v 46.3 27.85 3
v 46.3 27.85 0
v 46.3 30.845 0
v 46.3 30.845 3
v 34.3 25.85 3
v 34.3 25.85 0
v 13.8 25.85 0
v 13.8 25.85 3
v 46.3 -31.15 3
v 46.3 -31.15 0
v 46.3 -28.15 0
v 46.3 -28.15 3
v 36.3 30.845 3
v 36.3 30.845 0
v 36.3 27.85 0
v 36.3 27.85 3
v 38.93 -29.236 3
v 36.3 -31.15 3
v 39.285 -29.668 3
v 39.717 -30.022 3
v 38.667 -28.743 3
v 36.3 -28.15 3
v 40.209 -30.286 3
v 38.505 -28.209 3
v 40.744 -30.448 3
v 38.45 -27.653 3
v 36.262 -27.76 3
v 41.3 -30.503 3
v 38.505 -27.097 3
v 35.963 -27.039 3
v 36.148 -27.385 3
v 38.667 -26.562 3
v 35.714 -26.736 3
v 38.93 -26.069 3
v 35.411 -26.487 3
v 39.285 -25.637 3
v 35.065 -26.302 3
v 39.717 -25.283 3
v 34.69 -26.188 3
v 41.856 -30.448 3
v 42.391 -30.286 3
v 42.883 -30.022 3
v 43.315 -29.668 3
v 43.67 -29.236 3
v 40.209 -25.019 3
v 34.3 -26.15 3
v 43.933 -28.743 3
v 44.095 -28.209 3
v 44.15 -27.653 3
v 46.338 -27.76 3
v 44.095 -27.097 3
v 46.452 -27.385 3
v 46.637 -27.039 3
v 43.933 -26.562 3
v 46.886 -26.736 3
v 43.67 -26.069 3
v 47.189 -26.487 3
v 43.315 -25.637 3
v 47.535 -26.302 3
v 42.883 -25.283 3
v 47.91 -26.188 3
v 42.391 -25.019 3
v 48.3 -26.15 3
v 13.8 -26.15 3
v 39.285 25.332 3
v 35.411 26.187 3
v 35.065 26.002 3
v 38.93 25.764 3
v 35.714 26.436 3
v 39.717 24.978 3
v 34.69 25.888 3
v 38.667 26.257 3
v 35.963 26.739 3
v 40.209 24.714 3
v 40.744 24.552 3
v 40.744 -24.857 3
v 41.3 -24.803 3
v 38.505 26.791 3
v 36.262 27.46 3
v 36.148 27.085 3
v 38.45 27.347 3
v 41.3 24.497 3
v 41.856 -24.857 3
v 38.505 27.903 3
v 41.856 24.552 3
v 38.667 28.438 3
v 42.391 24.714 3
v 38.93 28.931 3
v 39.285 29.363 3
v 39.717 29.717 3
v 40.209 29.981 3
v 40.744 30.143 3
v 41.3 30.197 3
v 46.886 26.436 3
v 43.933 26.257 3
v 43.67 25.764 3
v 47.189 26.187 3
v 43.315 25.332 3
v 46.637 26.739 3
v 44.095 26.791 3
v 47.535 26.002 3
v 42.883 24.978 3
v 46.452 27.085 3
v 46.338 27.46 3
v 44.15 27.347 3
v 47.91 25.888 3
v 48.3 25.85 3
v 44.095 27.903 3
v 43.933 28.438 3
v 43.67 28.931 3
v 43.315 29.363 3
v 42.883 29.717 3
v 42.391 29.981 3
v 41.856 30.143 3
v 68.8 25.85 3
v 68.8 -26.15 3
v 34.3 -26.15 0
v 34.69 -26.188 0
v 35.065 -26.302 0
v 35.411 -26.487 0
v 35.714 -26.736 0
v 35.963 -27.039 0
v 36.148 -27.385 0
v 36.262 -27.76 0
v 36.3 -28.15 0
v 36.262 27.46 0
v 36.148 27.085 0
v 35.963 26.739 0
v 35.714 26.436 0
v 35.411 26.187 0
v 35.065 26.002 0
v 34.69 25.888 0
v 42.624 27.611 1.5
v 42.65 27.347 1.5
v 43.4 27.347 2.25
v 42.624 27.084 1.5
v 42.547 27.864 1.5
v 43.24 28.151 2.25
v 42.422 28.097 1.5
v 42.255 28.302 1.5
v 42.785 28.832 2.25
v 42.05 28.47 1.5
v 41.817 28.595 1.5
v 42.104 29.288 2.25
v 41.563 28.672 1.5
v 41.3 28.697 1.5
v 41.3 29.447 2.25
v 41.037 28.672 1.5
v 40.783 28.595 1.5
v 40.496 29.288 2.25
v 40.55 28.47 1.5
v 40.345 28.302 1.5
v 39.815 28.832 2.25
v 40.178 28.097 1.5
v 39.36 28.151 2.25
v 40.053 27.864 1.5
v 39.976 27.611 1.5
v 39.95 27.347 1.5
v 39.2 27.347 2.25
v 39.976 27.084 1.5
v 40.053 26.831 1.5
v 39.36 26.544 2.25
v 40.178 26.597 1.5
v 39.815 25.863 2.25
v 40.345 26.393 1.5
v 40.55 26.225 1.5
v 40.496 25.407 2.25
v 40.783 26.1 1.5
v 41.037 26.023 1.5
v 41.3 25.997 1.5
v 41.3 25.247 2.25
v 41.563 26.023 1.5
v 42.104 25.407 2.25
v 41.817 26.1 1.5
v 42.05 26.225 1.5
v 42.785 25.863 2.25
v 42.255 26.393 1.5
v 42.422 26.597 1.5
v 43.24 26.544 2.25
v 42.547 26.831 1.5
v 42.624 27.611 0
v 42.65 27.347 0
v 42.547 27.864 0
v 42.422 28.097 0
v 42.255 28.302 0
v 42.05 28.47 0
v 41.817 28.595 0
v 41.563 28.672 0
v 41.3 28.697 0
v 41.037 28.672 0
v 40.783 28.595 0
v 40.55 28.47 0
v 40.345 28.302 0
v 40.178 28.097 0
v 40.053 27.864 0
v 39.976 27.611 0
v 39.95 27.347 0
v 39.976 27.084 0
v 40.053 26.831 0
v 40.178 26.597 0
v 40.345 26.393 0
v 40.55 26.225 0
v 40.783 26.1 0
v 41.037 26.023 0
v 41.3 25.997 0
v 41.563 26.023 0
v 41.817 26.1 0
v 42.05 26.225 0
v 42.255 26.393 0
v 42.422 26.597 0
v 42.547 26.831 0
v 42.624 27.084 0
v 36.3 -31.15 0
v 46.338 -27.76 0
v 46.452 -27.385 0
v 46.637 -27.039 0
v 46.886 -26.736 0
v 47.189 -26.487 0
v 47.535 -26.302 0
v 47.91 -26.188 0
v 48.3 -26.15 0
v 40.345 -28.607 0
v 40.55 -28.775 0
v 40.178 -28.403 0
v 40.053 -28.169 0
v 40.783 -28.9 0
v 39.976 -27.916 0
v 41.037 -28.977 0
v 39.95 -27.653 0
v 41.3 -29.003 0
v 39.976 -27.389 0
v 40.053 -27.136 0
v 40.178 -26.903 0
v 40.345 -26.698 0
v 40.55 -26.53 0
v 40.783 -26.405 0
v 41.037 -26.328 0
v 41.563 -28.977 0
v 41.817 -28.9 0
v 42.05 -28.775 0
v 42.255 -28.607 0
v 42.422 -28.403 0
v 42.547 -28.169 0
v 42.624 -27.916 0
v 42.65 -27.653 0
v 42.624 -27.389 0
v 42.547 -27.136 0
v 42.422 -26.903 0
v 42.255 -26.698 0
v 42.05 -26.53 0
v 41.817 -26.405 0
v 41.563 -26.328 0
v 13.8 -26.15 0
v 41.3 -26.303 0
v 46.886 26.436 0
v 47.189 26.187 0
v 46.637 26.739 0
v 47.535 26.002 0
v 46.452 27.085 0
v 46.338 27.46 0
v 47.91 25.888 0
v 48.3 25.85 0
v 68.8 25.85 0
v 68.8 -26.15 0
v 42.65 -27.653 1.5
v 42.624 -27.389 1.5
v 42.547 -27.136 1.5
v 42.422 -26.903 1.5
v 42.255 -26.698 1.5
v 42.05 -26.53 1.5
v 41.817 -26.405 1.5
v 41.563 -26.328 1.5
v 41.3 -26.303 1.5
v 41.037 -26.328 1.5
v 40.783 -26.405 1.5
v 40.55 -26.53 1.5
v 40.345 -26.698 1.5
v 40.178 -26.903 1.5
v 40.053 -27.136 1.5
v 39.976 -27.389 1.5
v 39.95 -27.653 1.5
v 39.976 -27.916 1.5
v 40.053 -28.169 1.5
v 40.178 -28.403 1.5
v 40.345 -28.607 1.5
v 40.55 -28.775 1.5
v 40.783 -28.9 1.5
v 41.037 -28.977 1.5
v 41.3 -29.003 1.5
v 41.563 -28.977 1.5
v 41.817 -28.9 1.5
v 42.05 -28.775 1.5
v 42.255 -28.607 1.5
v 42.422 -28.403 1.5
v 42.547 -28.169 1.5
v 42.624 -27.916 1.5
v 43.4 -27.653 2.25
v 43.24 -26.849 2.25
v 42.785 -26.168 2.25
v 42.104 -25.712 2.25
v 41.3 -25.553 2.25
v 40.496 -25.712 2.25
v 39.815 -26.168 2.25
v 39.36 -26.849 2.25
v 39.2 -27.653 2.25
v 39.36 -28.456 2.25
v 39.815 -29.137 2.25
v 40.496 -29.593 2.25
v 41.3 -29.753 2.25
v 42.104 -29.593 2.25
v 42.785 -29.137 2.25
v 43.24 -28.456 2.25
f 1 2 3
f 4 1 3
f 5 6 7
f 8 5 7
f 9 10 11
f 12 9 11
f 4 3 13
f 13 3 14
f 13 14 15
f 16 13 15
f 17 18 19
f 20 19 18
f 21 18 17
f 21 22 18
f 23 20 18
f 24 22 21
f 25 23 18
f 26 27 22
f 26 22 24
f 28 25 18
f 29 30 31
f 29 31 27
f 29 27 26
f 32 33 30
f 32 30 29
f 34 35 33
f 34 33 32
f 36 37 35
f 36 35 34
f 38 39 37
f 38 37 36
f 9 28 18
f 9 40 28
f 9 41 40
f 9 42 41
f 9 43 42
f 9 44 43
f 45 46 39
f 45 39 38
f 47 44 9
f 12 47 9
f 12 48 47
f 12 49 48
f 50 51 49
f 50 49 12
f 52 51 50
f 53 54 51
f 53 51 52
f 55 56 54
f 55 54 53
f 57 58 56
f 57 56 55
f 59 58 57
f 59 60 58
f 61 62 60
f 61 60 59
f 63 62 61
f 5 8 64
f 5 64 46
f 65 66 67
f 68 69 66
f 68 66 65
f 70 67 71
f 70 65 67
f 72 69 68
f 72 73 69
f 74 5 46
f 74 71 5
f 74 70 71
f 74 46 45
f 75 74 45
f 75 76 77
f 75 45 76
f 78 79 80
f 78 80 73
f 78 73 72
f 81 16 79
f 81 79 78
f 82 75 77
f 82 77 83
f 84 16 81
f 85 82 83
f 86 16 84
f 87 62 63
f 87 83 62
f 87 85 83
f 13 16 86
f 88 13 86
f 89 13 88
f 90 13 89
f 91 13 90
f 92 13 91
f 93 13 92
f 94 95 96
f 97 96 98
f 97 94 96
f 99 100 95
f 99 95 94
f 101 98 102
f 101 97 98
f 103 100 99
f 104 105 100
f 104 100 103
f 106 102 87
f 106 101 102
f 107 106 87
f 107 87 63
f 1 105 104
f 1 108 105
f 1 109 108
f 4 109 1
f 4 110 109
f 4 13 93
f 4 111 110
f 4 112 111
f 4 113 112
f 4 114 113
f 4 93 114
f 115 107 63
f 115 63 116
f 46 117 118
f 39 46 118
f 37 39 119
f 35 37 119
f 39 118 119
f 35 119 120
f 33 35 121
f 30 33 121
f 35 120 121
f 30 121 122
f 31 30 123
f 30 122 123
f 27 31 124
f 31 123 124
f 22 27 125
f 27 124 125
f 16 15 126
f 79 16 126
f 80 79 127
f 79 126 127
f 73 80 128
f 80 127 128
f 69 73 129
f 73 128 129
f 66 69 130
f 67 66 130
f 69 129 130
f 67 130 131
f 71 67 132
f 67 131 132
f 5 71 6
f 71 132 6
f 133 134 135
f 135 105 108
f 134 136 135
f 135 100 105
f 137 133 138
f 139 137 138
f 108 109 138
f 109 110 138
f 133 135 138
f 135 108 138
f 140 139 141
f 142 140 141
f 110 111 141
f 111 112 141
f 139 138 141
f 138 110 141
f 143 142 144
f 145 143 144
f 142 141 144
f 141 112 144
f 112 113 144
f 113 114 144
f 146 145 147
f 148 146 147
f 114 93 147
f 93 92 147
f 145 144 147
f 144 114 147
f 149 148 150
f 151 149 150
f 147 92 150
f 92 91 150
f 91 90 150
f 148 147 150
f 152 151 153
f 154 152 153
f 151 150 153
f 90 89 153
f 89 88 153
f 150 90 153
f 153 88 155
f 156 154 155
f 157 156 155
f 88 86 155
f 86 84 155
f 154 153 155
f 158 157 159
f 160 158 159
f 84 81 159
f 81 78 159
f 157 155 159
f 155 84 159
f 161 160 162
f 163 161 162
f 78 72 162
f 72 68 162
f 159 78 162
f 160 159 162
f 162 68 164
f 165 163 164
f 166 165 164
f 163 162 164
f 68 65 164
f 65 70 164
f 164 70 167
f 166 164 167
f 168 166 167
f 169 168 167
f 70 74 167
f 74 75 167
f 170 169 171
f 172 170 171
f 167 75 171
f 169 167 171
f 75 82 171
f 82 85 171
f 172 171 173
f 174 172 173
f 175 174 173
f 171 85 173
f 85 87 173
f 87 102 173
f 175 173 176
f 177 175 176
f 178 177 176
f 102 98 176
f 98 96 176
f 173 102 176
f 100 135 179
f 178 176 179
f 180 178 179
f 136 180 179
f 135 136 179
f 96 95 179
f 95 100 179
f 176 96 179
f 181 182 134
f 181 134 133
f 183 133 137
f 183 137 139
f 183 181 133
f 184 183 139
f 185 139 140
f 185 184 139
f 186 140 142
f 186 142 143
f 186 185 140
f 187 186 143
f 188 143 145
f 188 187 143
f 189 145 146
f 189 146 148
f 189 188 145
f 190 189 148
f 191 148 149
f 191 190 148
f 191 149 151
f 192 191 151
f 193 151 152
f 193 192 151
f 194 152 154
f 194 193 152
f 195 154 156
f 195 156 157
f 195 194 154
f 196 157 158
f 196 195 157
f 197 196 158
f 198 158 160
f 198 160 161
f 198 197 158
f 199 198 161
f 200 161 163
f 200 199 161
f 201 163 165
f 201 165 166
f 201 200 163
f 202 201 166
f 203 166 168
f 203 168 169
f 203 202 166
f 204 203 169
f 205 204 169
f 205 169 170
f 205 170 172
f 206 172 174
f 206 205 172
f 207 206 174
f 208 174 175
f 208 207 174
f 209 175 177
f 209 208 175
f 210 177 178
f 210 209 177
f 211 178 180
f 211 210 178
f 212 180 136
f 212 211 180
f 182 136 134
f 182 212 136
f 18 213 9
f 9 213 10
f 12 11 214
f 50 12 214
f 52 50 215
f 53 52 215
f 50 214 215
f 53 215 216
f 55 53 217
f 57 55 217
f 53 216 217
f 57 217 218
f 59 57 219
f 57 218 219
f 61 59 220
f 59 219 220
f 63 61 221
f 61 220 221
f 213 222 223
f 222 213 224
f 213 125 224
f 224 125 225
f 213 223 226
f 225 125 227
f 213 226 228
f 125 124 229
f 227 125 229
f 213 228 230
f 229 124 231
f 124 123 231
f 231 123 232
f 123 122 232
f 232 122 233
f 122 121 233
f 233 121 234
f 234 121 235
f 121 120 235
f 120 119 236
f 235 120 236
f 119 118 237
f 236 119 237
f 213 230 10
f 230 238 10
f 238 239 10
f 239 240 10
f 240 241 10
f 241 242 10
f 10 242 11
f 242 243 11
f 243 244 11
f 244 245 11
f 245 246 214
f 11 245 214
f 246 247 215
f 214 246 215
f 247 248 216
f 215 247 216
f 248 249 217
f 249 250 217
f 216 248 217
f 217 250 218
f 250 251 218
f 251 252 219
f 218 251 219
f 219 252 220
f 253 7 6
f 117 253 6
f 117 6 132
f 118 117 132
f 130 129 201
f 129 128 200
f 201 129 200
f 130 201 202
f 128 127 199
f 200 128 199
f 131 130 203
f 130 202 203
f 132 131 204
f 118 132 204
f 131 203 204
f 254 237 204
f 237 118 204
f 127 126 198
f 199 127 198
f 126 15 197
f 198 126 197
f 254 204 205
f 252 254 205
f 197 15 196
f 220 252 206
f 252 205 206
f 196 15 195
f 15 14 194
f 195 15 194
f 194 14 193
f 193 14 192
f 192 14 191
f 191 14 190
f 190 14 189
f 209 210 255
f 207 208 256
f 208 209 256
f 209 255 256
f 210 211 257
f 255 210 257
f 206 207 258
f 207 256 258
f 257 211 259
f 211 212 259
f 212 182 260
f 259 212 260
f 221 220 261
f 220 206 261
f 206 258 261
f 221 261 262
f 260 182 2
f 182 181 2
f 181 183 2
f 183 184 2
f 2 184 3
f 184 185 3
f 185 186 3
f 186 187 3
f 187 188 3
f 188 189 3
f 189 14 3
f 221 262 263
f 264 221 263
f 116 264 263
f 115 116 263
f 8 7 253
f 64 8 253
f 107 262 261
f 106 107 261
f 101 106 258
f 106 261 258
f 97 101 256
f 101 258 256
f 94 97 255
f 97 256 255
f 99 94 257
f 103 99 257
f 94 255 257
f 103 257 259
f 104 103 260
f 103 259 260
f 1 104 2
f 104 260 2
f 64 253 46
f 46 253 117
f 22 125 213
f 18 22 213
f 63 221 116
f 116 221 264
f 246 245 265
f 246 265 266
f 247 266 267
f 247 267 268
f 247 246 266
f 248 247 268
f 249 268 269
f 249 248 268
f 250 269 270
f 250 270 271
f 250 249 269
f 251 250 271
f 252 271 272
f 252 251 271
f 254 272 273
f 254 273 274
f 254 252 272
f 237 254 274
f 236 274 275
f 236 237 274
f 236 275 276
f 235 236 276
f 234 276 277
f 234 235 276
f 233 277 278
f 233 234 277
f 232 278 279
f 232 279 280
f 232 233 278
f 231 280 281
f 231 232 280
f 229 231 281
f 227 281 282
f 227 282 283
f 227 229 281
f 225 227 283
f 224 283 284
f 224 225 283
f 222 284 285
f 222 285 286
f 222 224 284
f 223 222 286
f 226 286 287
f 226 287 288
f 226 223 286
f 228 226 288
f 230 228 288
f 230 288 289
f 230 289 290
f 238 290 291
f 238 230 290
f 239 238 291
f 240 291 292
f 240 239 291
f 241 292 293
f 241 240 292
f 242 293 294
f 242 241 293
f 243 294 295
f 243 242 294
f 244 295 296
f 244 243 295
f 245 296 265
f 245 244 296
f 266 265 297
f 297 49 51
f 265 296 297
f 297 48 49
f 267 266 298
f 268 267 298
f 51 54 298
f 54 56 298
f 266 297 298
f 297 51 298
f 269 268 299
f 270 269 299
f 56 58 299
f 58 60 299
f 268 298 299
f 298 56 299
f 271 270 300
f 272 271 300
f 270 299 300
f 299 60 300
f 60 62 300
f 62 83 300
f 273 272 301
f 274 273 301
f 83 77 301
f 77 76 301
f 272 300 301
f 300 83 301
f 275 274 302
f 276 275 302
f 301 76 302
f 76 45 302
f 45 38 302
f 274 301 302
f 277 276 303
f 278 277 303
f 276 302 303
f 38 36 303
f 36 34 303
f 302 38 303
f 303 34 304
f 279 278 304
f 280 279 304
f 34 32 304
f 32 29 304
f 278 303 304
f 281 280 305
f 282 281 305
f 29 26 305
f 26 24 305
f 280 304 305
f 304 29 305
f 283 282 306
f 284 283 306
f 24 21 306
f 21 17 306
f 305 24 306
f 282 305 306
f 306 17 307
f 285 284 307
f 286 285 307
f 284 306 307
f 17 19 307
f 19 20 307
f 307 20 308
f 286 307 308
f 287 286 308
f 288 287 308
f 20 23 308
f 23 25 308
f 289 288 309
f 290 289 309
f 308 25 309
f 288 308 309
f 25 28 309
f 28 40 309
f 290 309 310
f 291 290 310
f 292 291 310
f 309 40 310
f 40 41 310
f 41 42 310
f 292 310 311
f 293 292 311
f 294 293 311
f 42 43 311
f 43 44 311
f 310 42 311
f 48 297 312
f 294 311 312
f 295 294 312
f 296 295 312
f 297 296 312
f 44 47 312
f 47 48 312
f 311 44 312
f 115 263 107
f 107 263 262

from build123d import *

# Parameters (mm, degrees)
SKETCH_1_R      = 1.35
EXTRUDE_1_DEPTH = 3
CHAMFER_1_SIZE  = 1.5


with BuildPart() as part:
    # Эскиз1 → Бобышка-Вытянуть1 (new body)
    with BuildSketch(Plane.XY):
        with BuildLine():
            Line((68.8, 25.85), (48.3, 25.85))
            ThreePointArc((48.3, 25.85), (46.885786438, 26.435786438), (46.3, 27.85))
            Line((46.3, 27.85), (46.3, 30.84491535))
            Line((46.3, 30.84491535), (36.3, 30.84491535))
            Line((36.3, 30.84491535), (36.3, 27.85))
            ThreePointArc((36.3, 27.85), (35.714213562, 26.435786438), (34.3, 25.85))
            Line((34.3, 25.85), (13.8, 25.85))
            Line((13.8, 25.85), (13.8, -26.15))
            Line((13.8, -26.15), (34.3, -26.15))
            ThreePointArc((34.3, -26.15), (35.714213562, -26.735786438), (36.3, -28.15))
            Line((36.3, -28.15), (36.3, -31.15))
            Line((36.3, -31.15), (46.3, -31.15))
            Line((46.3, -31.15), (46.3, -28.15))
            ThreePointArc((46.3, -28.15), (46.885786438, -26.735786438), (48.3, -26.15))
            Line((48.3, -26.15), (68.8, -26.15))
            Line((68.8, -26.15), (68.8, 25.85))
        make_face()
        with Locations((41.3, 27.347457675)):
            Circle(SKETCH_1_R, mode=Mode.SUBTRACT)
        with Locations((41.3, -27.652542325)):
            Circle(SKETCH_1_R, mode=Mode.SUBTRACT)
    extrude(amount=EXTRUDE_1_DEPTH)

    # Фаска1
    chamfer_1_edges = [part.edges().sort_by_distance(p)[0] for p in [
        (39.95, -27.652542325, 3),
        (39.95, 27.347457675, 3),
    ]]
    chamfer(chamfer_1_edges, length=CHAMFER_1_SIZE)


solid = part.part
